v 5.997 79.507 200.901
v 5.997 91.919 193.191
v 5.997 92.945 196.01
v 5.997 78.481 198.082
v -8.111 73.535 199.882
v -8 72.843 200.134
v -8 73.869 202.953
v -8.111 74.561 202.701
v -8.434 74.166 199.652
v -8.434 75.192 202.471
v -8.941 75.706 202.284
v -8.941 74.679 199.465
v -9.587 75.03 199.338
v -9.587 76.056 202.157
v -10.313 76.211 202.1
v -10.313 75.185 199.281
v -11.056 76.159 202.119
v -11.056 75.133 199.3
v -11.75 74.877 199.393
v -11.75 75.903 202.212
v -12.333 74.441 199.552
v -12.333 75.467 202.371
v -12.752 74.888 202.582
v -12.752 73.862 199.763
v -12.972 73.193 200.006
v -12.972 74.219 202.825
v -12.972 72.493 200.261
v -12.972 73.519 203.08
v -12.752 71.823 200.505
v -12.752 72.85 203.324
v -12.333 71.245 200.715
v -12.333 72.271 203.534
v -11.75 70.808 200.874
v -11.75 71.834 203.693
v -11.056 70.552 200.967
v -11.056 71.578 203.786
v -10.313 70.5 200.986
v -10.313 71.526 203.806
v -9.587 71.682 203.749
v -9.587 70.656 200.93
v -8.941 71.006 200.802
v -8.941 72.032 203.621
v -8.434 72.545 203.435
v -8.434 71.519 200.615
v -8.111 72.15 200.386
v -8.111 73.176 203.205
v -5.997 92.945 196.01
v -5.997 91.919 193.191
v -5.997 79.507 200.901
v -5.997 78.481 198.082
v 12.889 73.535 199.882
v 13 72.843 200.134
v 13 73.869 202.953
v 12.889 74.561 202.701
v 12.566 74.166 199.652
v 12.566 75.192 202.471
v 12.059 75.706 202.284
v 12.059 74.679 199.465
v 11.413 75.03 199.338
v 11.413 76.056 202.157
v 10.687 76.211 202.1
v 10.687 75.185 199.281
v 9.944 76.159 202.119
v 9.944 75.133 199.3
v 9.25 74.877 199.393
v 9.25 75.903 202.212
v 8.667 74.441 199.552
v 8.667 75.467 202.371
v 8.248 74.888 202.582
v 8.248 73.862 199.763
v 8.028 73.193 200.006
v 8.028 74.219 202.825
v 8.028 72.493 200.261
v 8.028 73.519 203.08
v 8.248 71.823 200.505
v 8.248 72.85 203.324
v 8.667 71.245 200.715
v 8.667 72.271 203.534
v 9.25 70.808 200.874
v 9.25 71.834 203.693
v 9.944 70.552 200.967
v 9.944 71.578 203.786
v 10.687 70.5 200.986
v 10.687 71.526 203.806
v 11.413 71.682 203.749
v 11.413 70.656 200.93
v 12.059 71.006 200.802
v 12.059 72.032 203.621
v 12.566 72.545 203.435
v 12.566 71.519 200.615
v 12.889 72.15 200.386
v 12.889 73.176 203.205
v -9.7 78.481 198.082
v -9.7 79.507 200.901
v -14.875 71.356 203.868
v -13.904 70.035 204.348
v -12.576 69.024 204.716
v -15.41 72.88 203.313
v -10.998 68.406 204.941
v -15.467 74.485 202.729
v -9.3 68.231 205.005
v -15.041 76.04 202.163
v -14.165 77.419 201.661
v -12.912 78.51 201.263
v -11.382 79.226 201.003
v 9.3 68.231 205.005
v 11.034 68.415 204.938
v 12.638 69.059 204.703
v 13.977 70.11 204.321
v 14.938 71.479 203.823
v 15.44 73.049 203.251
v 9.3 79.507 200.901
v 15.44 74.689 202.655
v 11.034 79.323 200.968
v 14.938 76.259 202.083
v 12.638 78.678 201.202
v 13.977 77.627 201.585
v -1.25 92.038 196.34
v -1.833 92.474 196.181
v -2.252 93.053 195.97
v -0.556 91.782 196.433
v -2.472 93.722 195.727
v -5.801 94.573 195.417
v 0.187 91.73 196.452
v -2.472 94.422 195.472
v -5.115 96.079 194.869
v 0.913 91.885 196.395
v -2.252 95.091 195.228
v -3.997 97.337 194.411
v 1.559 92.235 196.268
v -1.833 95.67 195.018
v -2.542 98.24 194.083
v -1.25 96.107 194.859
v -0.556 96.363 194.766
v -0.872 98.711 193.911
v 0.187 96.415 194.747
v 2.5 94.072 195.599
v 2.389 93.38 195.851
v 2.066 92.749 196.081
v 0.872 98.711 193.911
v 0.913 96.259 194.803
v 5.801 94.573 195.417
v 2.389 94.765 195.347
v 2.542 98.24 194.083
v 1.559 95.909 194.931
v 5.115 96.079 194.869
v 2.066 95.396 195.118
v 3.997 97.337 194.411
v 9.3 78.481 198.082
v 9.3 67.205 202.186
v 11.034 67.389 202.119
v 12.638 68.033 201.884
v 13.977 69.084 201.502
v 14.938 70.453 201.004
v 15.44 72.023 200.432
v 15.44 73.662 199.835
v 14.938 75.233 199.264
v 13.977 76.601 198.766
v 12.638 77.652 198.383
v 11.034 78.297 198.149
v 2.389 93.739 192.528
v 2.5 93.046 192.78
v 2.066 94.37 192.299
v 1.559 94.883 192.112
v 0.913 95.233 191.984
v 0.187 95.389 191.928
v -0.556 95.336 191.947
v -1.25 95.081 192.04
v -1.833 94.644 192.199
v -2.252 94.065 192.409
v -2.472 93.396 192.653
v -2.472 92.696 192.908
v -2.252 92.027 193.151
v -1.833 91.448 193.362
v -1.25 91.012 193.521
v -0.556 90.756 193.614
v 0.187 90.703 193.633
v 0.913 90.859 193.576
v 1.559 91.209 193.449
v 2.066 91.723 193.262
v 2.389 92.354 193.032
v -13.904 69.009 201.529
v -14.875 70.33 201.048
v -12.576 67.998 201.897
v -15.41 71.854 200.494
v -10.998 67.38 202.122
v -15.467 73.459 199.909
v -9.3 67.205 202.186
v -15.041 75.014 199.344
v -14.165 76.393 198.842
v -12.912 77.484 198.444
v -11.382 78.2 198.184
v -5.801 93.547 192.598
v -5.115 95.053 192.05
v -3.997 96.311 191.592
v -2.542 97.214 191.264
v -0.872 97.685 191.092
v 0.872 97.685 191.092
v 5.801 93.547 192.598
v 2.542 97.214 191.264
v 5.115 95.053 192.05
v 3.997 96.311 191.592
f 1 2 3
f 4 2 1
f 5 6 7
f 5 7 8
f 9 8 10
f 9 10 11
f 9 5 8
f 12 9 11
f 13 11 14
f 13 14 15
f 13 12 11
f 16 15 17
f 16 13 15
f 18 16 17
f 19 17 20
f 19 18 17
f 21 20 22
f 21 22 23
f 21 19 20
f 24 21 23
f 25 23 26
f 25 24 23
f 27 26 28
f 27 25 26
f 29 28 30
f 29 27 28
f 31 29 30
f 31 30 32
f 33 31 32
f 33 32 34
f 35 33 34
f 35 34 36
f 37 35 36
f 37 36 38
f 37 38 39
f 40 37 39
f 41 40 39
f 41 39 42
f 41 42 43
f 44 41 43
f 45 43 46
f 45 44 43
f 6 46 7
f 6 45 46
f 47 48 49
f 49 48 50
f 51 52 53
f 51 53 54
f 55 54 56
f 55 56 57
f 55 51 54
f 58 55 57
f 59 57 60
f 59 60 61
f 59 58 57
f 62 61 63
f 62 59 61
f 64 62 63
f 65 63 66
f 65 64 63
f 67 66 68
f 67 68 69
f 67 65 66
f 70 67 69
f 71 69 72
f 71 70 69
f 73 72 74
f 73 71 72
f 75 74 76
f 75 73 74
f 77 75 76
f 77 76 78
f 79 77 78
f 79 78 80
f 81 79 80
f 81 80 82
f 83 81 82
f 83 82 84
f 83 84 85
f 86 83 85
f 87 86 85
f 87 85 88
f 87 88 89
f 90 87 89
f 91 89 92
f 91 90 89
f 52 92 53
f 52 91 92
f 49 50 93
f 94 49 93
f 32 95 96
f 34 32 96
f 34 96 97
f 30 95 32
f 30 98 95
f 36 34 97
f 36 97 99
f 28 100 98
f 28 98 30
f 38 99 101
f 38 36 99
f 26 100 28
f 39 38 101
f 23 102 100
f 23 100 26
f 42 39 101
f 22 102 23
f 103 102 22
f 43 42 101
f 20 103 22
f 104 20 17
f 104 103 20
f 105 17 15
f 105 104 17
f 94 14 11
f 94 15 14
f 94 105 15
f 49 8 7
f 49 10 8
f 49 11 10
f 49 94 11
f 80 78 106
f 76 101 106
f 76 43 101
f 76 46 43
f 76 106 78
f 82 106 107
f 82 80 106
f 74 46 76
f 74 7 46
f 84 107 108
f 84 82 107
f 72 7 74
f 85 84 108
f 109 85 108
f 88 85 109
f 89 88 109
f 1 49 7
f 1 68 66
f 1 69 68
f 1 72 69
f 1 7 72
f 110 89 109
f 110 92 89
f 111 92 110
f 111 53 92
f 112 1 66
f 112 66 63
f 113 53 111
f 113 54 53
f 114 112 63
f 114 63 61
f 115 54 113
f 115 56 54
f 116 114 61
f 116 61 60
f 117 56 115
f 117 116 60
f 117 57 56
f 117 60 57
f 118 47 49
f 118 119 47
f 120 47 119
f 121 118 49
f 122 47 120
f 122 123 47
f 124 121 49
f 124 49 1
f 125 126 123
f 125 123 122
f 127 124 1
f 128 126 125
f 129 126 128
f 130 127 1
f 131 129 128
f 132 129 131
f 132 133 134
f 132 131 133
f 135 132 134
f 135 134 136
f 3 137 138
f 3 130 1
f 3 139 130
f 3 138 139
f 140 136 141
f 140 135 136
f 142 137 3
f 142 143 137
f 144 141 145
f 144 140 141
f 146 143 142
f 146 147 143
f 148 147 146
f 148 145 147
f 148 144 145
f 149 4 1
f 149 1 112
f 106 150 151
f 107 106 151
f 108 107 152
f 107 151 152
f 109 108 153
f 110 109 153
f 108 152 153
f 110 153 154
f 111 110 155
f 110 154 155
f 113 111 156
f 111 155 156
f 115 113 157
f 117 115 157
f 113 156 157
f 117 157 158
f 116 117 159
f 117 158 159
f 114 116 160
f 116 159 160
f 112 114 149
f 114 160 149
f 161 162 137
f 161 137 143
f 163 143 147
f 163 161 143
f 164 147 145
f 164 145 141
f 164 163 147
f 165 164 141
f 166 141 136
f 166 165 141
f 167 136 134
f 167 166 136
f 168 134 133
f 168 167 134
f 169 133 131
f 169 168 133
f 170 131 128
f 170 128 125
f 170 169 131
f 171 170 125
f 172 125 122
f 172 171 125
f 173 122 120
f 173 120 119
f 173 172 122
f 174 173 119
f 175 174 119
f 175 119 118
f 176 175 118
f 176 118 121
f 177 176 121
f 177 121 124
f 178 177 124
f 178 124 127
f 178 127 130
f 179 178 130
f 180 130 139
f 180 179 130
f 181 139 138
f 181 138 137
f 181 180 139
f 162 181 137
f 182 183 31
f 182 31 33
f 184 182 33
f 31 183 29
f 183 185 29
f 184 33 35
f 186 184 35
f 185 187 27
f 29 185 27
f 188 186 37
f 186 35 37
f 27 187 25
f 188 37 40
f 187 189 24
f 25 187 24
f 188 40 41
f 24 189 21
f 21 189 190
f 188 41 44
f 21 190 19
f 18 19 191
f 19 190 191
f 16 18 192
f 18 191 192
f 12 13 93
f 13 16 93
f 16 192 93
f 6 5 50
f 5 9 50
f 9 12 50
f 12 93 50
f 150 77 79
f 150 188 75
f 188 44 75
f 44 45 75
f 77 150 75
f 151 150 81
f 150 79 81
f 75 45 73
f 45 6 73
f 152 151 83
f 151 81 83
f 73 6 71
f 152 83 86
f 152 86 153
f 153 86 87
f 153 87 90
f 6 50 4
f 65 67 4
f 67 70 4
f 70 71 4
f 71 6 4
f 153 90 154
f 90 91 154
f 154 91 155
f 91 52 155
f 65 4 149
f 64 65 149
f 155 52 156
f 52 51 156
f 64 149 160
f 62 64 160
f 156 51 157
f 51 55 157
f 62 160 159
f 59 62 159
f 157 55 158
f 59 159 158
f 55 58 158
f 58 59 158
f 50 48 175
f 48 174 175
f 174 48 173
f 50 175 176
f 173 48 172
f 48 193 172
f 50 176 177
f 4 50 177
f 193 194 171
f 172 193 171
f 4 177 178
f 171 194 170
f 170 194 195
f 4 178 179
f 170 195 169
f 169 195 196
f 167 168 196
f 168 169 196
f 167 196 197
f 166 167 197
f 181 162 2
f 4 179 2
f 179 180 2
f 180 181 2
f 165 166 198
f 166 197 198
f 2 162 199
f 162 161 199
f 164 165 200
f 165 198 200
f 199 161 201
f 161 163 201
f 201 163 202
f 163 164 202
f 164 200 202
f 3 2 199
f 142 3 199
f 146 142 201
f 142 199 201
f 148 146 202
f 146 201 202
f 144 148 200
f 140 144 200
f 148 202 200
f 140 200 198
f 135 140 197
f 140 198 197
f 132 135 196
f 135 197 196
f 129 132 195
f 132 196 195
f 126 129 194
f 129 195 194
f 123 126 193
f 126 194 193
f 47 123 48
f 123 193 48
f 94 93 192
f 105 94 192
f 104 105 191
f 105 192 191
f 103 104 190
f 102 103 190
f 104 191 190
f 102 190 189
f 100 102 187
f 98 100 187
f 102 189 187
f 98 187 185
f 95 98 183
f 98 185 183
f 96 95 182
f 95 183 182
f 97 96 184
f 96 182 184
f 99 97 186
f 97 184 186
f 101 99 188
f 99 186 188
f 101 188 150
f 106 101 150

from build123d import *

# Parameters (mm, degrees)
SKETCH001_AS_DRAWN_R                   = 2.5
EXTRUDE_DEPTH                          = 3
EXTRUDE_ONTO_SKETCH001_PLACEMENT_ANGLE = 20


with BuildPart() as part:
    # Sketch001 as drawn → Extrude (new)
    with BuildSketch(Plane.XY):
        with BuildLine():
            ThreePointArc((5.996666, 20.3), (0, 26.5), (-5.996666, 20.3))
            Line((-5.996666, 20.3), (-5.996666, 17))
            Line((-5.996666, 17), (-5.996666, 6))
            Line((-5.996666, 6), (-9.7, 6))
            ThreePointArc((-9.7, 6), (-15.5, -0.2), (-9.3, -6))
            Line((-9.3, -6), (-6, -6))
            Line((-6, -6), (6, -6))
            Line((6, -6), (9.3, -6))
            ThreePointArc((9.3, -6), (15.503332, 0), (9.3, 6))
            Line((5.996666, 6), (9.3, 6))
            Line((5.996666, 17), (5.996666, 6))
            Line((5.996666, 20.3), (5.996666, 17))
        make_face()
        with Locations((0, 21.5)):
            Circle(SKETCH001_AS_DRAWN_R, mode=Mode.SUBTRACT)
        with Locations((-10.5, 0)):
            Circle(SKETCH001_AS_DRAWN_R, mode=Mode.SUBTRACT)
        with Locations((10.5, 0)):
            Circle(SKETCH001_AS_DRAWN_R, mode=Mode.SUBTRACT)
    extrude(amount=EXTRUDE_DEPTH)


with BuildPart() as part_1:
    # Extrude onto Sketch001 placement: moved
    add(part.part.moved(Location((0, 72.842742, 200.133789))).rotate(Axis((0, 72.842742, 200.133789), (-1, 0, 0)), EXTRUDE_ONTO_SKETCH001_PLACEMENT_ANGLE))


solid = part_1.part
